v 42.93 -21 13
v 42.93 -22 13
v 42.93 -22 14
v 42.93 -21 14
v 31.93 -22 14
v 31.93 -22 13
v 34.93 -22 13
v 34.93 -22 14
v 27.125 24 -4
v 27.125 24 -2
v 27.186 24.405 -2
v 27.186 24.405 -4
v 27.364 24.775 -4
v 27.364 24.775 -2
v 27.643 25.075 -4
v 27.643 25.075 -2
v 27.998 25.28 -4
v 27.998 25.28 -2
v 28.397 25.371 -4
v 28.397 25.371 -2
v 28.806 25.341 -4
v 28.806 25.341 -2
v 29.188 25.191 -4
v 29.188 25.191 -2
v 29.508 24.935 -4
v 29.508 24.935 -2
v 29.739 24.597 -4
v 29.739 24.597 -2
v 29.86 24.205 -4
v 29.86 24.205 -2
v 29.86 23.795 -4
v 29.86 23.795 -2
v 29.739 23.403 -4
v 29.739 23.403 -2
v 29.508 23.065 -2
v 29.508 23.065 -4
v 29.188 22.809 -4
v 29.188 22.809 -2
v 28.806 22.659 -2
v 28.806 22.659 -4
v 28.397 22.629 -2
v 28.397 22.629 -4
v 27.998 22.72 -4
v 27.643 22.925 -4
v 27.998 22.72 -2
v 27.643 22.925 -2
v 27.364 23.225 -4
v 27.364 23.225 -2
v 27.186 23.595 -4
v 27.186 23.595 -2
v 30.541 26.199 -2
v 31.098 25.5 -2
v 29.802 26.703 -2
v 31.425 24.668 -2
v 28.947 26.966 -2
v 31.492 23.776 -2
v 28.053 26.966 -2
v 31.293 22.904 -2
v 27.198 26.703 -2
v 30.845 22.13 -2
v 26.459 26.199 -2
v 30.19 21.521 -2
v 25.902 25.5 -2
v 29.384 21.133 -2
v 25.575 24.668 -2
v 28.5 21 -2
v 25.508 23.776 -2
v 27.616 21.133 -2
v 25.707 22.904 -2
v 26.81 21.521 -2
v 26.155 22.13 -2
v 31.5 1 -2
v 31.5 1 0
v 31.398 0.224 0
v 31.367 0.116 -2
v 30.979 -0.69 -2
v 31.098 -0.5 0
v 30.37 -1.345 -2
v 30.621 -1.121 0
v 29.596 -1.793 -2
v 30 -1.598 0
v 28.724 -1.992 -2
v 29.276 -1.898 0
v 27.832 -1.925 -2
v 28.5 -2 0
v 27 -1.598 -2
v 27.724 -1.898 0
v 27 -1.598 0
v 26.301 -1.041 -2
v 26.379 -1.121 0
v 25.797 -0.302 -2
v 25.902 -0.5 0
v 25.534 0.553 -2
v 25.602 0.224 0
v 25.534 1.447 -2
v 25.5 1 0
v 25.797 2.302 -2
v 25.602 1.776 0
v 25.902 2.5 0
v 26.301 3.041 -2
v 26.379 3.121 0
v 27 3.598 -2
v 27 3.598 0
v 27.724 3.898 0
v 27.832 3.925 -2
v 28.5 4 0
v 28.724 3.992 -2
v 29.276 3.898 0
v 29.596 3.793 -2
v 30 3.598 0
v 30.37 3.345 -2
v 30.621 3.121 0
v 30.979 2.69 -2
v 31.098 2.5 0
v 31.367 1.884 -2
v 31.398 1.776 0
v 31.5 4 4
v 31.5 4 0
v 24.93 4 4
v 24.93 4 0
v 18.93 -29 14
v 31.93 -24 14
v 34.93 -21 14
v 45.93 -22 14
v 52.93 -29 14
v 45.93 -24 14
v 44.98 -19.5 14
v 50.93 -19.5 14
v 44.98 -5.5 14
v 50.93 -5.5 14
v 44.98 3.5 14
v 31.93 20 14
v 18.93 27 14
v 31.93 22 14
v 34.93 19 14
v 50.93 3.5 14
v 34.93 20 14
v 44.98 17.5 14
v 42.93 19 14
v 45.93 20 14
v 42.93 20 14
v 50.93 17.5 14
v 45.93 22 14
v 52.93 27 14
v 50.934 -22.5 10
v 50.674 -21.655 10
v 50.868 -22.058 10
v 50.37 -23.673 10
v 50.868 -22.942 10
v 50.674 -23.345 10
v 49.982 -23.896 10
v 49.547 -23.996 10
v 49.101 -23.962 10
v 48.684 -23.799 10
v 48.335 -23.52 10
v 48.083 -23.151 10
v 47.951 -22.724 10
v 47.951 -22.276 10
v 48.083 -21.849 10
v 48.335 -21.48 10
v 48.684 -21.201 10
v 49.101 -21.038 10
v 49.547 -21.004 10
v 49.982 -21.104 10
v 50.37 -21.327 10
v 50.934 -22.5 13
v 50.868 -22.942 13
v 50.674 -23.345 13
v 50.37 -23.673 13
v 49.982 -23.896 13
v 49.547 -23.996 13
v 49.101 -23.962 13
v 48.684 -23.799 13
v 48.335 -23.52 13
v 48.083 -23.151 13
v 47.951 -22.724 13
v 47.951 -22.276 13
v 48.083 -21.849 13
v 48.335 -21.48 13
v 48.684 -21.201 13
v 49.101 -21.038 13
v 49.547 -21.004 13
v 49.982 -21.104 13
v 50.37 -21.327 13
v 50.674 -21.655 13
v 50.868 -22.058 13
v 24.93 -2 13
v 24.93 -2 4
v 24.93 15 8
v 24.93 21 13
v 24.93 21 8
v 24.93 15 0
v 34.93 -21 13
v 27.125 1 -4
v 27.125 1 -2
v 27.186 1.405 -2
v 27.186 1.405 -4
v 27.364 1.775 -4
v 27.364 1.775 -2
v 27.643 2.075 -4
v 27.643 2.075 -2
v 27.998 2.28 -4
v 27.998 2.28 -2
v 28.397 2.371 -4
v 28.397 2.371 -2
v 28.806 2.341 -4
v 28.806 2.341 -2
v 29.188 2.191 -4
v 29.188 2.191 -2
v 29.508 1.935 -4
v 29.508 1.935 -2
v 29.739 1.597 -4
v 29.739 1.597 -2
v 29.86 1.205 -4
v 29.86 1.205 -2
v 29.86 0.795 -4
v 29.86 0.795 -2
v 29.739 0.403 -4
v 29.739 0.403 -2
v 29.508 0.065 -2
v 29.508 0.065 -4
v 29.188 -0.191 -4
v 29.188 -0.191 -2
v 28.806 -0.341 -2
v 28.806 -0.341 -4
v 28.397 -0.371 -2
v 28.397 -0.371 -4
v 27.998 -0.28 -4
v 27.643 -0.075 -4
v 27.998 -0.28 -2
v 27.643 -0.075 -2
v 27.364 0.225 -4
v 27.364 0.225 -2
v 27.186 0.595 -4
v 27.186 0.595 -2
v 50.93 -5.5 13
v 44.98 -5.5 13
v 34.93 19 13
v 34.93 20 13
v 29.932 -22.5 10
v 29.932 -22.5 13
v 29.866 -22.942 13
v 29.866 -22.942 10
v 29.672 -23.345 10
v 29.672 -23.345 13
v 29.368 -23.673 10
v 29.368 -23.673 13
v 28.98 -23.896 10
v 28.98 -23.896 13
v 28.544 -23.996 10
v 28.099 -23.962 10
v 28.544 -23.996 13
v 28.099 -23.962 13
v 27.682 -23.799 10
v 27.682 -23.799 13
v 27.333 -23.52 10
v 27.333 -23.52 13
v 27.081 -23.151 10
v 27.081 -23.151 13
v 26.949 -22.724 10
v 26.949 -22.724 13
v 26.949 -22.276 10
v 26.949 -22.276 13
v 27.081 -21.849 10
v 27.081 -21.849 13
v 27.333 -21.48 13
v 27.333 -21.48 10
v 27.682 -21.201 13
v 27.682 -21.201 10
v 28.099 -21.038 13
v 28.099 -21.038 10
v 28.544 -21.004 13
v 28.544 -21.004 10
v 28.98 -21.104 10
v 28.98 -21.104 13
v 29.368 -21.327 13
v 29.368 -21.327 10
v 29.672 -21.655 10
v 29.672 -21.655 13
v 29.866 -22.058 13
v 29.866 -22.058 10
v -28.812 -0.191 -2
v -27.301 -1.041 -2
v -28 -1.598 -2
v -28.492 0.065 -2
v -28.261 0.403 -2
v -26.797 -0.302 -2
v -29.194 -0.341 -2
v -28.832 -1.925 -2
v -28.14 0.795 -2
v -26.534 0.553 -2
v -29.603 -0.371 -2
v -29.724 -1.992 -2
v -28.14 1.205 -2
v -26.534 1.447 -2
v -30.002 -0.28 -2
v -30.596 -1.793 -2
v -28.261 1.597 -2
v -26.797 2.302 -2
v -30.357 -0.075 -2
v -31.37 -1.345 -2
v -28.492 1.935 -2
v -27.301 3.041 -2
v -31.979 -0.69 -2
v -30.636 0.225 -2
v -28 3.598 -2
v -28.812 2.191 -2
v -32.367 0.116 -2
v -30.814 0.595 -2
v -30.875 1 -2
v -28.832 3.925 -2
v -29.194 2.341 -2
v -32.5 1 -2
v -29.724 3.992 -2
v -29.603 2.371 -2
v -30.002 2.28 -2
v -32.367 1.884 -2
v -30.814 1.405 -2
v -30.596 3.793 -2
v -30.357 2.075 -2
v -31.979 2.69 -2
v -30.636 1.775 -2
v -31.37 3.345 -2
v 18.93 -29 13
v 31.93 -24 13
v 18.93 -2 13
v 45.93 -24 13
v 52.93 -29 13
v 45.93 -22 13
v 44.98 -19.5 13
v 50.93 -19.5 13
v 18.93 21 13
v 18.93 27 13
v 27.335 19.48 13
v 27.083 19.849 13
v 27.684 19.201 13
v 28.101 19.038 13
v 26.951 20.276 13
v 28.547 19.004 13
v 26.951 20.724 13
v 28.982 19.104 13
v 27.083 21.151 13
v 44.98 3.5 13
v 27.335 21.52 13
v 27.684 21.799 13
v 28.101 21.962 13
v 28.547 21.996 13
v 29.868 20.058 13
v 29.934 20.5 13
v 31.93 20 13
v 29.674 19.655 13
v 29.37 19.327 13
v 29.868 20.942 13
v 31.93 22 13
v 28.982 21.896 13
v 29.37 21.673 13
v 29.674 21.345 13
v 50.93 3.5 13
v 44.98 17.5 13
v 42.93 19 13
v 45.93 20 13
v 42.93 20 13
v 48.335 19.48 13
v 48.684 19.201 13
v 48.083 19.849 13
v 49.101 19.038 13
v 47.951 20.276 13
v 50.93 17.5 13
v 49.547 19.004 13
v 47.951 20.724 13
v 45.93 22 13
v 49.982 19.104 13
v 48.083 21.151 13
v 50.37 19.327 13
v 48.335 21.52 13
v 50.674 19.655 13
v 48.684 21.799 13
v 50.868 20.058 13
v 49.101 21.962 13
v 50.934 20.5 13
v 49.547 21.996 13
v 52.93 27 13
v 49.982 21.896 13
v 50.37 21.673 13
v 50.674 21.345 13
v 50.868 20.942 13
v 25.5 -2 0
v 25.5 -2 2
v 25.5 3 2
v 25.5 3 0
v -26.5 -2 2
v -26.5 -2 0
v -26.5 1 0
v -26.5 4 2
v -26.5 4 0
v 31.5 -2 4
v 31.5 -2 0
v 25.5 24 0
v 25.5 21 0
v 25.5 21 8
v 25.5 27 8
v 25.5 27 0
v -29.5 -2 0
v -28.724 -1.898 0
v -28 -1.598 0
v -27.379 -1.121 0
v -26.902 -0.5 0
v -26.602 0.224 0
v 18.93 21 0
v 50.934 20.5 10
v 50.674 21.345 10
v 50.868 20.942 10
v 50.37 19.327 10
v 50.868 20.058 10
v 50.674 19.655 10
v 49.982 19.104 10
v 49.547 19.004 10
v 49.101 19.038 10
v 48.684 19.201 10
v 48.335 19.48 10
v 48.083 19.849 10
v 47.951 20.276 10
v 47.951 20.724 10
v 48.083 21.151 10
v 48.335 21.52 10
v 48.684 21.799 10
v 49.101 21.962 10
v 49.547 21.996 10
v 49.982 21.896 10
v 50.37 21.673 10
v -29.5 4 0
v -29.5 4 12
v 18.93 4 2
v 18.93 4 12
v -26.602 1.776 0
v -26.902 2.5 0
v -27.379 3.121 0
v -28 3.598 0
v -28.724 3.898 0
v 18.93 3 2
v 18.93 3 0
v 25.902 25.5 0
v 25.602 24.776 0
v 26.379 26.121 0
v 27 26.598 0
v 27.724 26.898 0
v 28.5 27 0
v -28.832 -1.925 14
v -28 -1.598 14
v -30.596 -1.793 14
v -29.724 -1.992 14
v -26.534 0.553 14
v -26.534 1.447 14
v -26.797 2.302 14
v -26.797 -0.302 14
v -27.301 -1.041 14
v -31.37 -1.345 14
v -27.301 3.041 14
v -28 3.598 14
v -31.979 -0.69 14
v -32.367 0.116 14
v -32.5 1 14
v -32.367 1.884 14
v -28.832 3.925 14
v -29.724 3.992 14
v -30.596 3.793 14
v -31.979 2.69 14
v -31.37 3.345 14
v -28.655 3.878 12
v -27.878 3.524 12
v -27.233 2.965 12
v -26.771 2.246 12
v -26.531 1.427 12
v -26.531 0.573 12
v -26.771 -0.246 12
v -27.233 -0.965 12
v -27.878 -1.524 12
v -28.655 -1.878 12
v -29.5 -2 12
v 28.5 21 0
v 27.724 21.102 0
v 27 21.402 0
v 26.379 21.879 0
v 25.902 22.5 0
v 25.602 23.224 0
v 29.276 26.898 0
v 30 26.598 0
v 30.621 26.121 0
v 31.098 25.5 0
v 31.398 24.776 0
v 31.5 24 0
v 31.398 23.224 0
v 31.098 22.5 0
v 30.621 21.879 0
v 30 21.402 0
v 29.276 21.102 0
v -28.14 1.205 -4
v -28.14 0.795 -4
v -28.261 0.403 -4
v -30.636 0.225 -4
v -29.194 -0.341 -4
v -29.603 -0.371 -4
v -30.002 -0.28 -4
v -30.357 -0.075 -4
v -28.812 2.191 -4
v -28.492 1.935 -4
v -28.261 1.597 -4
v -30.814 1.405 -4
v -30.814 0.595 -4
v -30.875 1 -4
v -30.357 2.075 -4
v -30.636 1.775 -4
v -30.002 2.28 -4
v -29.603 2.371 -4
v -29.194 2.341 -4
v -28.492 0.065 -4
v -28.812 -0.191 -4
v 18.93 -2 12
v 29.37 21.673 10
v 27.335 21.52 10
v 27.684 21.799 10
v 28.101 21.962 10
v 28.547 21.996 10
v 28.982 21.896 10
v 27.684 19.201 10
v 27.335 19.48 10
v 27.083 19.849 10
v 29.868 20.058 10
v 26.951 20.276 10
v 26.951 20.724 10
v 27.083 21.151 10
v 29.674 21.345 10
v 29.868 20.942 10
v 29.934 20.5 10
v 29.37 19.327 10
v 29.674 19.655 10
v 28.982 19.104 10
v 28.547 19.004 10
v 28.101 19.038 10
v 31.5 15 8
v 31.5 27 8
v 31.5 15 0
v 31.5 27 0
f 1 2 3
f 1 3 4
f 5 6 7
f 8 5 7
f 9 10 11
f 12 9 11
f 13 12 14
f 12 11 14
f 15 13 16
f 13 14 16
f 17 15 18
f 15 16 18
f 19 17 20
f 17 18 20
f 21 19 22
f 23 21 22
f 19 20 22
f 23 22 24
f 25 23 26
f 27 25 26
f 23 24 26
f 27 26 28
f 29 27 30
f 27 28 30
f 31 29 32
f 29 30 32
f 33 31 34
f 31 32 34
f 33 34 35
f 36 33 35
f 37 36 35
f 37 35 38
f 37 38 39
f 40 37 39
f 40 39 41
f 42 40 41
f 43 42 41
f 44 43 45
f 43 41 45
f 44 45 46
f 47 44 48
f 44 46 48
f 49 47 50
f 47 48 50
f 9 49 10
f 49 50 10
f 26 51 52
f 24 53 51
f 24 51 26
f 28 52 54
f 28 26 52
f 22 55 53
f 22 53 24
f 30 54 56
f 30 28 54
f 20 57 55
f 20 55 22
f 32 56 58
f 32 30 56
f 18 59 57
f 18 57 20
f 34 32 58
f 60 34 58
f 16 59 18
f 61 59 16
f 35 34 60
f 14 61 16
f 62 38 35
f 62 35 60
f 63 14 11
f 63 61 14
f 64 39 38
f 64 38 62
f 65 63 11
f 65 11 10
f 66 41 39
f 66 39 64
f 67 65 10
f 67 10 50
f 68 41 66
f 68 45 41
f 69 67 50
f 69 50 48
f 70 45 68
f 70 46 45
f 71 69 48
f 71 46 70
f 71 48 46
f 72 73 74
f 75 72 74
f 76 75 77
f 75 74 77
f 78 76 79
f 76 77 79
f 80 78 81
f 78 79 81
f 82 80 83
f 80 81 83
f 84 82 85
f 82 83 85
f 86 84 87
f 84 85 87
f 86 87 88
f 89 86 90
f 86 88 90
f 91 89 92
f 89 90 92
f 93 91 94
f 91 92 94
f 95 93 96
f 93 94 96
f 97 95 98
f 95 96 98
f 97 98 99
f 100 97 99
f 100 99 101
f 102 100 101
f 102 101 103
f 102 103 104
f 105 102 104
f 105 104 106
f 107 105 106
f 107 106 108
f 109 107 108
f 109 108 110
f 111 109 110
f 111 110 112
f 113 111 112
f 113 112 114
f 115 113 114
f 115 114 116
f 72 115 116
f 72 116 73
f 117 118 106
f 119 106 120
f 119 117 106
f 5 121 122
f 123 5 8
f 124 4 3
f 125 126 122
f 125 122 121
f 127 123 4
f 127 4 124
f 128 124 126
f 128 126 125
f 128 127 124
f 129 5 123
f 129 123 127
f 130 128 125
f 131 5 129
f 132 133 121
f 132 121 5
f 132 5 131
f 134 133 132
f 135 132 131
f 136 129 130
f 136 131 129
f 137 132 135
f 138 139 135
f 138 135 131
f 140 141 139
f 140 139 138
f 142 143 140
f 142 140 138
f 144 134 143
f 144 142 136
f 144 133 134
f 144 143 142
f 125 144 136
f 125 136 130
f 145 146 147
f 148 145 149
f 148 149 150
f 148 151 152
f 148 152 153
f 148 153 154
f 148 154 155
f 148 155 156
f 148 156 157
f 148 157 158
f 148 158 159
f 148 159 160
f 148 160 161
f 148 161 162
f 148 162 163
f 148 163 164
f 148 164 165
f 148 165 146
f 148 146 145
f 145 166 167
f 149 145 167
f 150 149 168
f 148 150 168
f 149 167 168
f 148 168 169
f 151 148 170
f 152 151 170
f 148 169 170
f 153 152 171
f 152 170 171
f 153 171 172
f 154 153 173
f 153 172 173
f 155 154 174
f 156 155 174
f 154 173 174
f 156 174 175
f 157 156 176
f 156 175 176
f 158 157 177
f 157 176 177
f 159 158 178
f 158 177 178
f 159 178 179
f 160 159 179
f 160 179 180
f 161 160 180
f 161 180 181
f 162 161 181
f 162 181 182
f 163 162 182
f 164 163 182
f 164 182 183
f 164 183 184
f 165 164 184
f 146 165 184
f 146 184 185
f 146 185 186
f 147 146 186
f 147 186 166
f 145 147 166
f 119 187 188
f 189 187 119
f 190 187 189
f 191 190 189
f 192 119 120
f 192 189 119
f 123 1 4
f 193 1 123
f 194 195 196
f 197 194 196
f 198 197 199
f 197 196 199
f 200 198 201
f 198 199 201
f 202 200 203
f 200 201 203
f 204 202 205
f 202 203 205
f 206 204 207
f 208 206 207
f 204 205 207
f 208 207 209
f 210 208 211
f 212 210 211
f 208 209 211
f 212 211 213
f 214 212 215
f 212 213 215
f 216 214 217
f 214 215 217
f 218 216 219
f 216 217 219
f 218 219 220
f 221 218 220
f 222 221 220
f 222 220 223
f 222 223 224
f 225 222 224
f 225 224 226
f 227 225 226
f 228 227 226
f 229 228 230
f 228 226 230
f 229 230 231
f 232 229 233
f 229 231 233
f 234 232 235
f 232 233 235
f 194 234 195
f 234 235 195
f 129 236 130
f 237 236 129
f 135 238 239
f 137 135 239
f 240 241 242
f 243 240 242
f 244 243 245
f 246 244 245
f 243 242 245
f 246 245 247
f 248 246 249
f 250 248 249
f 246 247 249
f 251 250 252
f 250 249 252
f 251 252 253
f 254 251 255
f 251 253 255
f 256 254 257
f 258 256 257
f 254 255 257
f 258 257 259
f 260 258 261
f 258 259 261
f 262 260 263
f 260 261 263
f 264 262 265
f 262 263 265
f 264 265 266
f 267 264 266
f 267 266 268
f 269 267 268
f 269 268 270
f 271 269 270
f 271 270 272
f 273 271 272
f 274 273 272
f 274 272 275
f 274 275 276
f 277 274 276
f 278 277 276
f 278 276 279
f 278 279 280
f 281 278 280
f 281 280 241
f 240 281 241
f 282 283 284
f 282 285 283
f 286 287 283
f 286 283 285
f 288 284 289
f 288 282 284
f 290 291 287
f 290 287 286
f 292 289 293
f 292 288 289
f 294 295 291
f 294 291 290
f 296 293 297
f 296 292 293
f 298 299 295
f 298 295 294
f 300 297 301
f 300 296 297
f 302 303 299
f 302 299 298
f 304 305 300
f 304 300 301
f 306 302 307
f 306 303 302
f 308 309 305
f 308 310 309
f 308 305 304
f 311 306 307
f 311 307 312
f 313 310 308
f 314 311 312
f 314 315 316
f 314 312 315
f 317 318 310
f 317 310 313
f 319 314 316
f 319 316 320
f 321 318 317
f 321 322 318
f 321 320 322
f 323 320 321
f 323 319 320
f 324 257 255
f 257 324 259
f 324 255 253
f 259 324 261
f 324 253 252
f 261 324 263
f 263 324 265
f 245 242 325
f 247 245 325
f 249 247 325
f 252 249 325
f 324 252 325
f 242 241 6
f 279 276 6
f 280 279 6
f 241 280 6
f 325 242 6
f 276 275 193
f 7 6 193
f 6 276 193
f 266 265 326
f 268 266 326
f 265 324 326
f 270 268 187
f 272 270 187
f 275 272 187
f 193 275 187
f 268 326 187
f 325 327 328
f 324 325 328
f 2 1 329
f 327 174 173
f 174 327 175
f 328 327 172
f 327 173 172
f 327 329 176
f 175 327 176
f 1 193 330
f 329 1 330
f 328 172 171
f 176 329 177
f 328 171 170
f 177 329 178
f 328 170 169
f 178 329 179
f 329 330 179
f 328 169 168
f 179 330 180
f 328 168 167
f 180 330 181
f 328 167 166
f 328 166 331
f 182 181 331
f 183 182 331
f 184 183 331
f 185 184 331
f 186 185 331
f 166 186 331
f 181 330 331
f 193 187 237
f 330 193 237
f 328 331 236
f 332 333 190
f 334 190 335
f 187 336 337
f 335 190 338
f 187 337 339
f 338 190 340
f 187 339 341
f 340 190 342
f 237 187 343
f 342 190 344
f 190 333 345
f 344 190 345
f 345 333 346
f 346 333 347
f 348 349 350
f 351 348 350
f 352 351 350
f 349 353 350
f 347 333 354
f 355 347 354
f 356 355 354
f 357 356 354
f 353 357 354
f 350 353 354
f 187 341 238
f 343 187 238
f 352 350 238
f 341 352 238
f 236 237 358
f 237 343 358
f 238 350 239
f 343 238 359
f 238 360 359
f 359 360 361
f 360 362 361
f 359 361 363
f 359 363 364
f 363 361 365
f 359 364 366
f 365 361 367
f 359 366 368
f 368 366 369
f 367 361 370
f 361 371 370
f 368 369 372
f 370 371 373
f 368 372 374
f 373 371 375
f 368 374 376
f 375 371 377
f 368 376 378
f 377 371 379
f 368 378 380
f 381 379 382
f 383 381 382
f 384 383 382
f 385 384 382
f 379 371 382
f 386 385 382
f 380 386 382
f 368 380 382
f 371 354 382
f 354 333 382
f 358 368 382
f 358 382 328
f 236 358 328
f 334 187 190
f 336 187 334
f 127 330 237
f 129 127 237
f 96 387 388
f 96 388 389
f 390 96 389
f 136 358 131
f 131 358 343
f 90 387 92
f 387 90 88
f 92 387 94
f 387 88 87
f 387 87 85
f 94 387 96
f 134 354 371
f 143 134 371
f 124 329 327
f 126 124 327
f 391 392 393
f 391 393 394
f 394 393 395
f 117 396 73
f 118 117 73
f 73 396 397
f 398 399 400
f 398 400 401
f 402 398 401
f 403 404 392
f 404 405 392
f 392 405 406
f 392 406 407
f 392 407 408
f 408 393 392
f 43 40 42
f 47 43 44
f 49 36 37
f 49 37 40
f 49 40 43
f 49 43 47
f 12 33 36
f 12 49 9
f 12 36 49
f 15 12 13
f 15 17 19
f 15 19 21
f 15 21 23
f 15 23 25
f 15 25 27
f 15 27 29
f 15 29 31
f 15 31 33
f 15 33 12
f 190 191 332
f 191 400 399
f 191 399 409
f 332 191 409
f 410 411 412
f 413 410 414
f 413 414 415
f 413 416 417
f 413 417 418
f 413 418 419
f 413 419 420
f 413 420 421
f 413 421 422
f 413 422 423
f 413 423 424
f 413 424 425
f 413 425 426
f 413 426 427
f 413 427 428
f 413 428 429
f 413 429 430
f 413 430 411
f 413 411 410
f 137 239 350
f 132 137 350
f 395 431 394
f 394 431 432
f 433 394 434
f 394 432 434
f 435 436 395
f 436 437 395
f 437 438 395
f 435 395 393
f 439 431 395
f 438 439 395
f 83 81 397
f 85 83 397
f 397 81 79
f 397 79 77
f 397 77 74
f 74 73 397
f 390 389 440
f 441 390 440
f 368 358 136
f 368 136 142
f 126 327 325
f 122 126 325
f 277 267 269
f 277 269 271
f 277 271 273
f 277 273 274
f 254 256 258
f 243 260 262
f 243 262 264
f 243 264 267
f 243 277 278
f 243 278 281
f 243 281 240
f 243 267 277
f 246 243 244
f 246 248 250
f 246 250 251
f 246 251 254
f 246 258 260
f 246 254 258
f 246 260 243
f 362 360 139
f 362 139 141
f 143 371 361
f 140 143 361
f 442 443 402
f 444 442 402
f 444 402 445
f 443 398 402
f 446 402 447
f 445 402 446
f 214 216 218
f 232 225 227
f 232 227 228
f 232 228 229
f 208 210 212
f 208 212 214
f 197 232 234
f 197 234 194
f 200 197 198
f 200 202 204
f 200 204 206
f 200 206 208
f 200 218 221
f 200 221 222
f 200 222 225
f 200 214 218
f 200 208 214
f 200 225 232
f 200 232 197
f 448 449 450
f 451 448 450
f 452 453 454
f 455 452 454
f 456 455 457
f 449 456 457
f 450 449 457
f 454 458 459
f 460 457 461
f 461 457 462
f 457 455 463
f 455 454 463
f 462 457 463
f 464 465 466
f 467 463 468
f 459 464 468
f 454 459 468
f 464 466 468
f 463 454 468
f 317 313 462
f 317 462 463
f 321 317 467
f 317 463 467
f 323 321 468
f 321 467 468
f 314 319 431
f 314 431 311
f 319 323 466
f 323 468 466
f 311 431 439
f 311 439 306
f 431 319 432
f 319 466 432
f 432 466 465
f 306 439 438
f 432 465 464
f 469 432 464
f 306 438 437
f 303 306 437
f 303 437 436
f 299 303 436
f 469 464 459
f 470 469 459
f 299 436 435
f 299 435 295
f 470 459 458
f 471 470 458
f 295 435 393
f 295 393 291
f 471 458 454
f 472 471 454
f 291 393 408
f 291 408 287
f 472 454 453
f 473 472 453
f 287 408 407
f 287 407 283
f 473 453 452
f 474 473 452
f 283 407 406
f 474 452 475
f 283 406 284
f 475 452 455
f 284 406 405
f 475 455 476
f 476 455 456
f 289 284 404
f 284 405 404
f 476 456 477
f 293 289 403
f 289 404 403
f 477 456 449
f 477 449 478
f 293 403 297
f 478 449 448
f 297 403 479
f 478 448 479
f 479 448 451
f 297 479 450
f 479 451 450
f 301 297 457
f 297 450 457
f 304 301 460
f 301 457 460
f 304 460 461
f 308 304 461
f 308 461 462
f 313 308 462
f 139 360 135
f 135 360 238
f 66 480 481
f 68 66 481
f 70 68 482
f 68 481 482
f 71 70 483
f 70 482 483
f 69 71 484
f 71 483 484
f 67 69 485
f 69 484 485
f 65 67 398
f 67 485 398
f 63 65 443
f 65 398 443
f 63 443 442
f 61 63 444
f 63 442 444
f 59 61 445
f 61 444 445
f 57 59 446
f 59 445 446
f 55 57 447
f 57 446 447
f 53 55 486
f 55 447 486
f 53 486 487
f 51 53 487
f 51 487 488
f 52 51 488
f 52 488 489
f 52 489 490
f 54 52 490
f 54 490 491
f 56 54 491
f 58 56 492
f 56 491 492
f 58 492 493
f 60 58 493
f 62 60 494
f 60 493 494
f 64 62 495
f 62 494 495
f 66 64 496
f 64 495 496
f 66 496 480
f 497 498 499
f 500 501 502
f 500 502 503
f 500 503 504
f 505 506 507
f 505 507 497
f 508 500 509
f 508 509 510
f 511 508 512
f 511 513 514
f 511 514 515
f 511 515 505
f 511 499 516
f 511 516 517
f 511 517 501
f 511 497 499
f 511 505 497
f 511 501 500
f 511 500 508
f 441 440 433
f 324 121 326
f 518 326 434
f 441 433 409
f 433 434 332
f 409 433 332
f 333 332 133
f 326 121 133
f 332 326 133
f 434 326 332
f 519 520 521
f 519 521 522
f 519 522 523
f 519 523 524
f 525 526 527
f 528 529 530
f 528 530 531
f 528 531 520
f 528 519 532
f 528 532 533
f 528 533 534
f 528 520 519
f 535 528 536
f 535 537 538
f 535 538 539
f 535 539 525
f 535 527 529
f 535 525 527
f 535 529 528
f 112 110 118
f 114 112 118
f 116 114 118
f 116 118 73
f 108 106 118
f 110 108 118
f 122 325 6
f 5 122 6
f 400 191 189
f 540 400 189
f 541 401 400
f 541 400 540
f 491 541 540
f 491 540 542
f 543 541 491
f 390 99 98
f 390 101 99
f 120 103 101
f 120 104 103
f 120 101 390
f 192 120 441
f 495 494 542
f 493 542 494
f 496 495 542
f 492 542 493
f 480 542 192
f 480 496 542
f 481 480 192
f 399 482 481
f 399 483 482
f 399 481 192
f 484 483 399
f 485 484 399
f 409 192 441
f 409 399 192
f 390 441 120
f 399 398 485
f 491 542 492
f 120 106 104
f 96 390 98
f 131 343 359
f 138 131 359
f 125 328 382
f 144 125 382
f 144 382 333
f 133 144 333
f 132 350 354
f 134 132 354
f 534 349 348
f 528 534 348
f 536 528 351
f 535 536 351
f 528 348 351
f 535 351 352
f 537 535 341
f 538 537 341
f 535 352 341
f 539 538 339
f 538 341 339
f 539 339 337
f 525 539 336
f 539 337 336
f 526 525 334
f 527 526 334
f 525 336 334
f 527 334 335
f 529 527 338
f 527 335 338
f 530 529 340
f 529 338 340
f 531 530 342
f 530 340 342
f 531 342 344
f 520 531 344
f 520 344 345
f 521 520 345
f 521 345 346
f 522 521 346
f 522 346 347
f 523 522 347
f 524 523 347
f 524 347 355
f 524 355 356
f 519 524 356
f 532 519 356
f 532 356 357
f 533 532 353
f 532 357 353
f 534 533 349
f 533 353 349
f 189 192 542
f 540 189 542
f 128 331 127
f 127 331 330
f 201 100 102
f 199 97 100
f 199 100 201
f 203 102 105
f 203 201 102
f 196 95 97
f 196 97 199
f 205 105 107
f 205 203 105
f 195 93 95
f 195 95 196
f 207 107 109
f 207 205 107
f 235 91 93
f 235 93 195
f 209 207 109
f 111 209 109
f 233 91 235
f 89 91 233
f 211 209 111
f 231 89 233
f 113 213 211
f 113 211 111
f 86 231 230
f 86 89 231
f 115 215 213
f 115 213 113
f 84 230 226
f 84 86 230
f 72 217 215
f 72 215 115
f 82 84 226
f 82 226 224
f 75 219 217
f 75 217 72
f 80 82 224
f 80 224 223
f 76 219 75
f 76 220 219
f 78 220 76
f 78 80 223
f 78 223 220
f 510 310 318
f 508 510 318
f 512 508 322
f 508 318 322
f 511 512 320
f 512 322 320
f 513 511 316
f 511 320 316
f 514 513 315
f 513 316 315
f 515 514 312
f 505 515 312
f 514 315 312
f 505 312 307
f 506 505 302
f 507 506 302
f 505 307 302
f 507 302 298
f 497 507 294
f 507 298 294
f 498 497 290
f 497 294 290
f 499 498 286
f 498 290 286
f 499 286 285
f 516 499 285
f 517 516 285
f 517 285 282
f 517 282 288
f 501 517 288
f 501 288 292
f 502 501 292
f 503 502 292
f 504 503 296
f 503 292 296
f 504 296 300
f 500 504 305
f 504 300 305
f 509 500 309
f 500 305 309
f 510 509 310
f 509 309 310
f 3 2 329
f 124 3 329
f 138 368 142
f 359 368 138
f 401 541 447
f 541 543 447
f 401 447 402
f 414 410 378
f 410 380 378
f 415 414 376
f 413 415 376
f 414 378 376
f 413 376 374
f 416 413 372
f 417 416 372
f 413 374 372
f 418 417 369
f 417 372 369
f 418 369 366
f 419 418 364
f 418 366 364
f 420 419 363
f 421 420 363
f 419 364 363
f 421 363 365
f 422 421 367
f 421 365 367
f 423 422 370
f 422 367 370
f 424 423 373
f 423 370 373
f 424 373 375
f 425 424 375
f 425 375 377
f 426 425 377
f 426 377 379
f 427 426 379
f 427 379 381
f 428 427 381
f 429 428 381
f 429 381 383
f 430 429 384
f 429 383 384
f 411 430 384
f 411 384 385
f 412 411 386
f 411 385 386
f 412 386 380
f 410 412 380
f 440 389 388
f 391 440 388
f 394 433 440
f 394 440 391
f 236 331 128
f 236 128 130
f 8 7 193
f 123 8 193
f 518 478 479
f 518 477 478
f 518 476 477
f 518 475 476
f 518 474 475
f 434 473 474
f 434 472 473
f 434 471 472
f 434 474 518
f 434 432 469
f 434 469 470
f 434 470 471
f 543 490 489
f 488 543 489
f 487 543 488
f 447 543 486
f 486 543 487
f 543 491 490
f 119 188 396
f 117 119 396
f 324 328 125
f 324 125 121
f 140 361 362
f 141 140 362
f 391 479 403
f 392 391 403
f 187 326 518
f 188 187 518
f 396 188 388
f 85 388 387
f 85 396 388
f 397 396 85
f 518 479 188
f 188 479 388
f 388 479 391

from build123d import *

# Parameters (mm, degrees)
SKETCH_1_W            = 65
SKETCH_1_H            = 6
EXTRUDE_1_DEPTH       = 12
FILLET_4_R            = 3
FILLET_5_R            = 3
SKETCH_7_R            = 1.375
EXTRUDE_2_DEPTH       = 4
SKETCH_8_R            = 3
EXTRUDE_3_DEPTH       = 2
EXTRUDE_START         = 4
SKETCH_9_R            = 3
EXTRUDE_4_DEPTH       = 4
SKETCH_10_R           = 3
EXTRUDE_5_DEPTH       = 2
SKETCH_11_R           = 1.375
EXTRUDE_6_DEPTH       = 2
SKETCH_12_W           = 6
SKETCH_12_H           = 6
EXTRUDE_7_DEPTH       = 2
SKETCH_13_W           = 6
SKETCH_13_H           = 30
EXTRUDE_8_DEPTH       = 2
SKETCH_14_R           = 3
EXTRUDE_9_DEPTH       = 2
SKETCH_15_R           = 1.375
EXTRUDE_10_DEPTH      = 4
SKETCH_18_W           = 6
SKETCH_18_H           = 30
EXTRUDE_11_DEPTH      = 4
SKETCH_19_W           = 6
SKETCH_19_H           = 30
EXTRUDE_12_DEPTH      = 10
SKETCH_29_W           = 68.740273107
SKETCH_29_H           = 36.698484322
CUT_EXTRUDE_3_DEPTH   = 2
SKETCH_30_W           = 7.57
SKETCH_30_H           = 6
CUT_EXTRUDE_4_DEPTH   = 12
SKETCH_31_W           = 7.57
SKETCH_31_H           = 24
EXTRUDE_18_DEPTH      = 2
SKETCH_32_W           = 6
SKETCH_32_H           = 18
CUT_EXTRUDE_6_DEPTH   = 2
SKETCH_33_W           = 1.57
SKETCH_33_H           = 18
CUT_EXTRUDE_7_DEPTH   = 2
SKETCH_34_W           = 34
SKETCH_34_H           = 50
EXTRUDE_19_DEPTH      = 1
SKETCH_35_R           = 1.5
EXTRUDE_20_DEPTH      = 2
SKETCH_36_W           = 18
SKETCH_36_H           = 4
CUT_EXTRUDE_8_DEPTH   = 3
SKETCH_37_W           = 18
SKETCH_37_H           = 4
CUT_EXTRUDE_9_DEPTH   = 3
SKETCH_38_W           = 7.949608938
SKETCH_38_H           = 37
CUT_EXTRUDE_10_DEPTH  = 3
SKETCH_39_W           = 2
SKETCH_39_H           = 38.777384981
EXTRUDE_21_DEPTH      = 1
SKETCH_40_W           = 19.891420203
SKETCH_40_H           = 2
EXTRUDE_22_DEPTH      = 1
SKETCH_41_W           = 18
SKETCH_41_H           = 2
EXTRUDE_23_DEPTH      = 1
SKETCH_42_W           = 5.949608938
SKETCH_42_H           = 7.78599904
EXTRUDE_24_DEPTH      = 1
SKETCH_43_W           = 2
SKETCH_43_H           = 2
EXTRUDE_25_DEPTH      = 1
SKETCH_44_W           = 34
SKETCH_44_H           = 6
EXTRUDE_26_DEPTH      = 1
SKETCH_45_W           = 5.949608938
SKETCH_45_H           = 1.150209715
SKETCH_45_H_2         = 0.063791245
EXTRUDE_27_DEPTH      = 1
SKETCH_46_W           = 7
SKETCH_46_H           = 1
CUT_EXTRUDE_11_DEPTH  = 11
SKETCH_47_W           = 5
SKETCH_47_H           = 6
EXTRUDE_28_DEPTH      = 7
SKETCH_48_W           = 7.57
SKETCH_48_H           = 6
EXTRUDE_29_DEPTH      = 2
SKETCH_50_W           = 26.677609113
SKETCH_50_H           = 51.423807613
EXTRUDE_35_DEPTH      = 1
SKETCH_53_W           = 28.548663147
SKETCH_53_H           = 51.906660266
CUT_EXTRUDE_21_DEPTH  = 2
SKETCH_52_R           = 1.5
EXTRUDE_37_DEPTH      = 2
SKETCH_49_W           = 5.949608938
SKETCH_49_H           = 14
CUT_EXTRUDE_22_DEPTH  = 4
SKETCH_55_W           = 2
SKETCH_55_H           = 29.414250284
EXTRUDE_40_DEPTH      = 4
SKETCH_58_W           = 25.591190643
SKETCH_58_H           = 50.94095496
CUT_EXTRUDE_23_DEPTH  = 4
SKETCH_57_R           = 1.5
EXTRUDE_41_DEPTH      = 2
SKETCH_60_W           = 26.134399878
SKETCH_60_H           = 52.268799757
EXTRUDE_43_DEPTH      = 1
SKETCH_59_W           = 5.949608938
SKETCH_59_H           = 14
CUT_EXTRUDE_24_DEPTH  = 1
SKETCH_64_W           = 54.796032673
SKETCH_64_H           = 10.19721688
CUT_EXTRUDE_25_DEPTH  = 43
SKETCH_62_R           = 3
EXTRUDE_44_DEPTH      = 2
SKETCH_63_R           = 3
EXTRUDE_45_DEPTH      = 2
SKETCH_65_R           = 1.375
EXTRUDE_46_DEPTH      = 2
SKETCH_66_W           = 1
SKETCH_66_H           = 30
CUT_EXTRUDE_26_DEPTH  = 5
SKETCH_68_W           = 6.57
SKETCH_68_H           = 9
EXTRUDE_47_DEPTH      = 12
SKETCH_67_W           = 6.57
SKETCH_67_H           = 6
CUT_EXTRUDE_29_DEPTH  = 13
SKETCH_70_W           = 48.43
SKETCH_70_H           = 12
EXTRUDE_48_DEPTH      = 7
SKETCH_71_W           = 6.57
SKETCH_71_H           = 4
EXTRUDE_49_DEPTH      = 1
SKETCH_74_R           = 3
CUT_EXTRUDE_30_DEPTH  = 32
SKETCH_75_W           = 3.133028802
SKETCH_75_H           = 7
EXTRUDE_51_DEPTH      = 12
SKETCH_76_W           = 8.590635634
SKETCH_76_H           = 9.113505167
CUT_EXTRUDE_31_DEPTH  = 12
SKETCH_77_W           = 13
SKETCH_77_H           = 1
CUT_EXTRUDE_32_DEPTH  = 124
SKETCH_72_R           = 3
EXTRUDE_52_DEPTH      = 2
EXTRUDE_53_DEPTH      = 2
EXTRUDE_53_DEPTH_BACK = 14
SKETCH_73_R           = 3
SKETCH_78_R           = 1.375
EXTRUDE_54_DEPTH      = 2
SKETCH_79_W           = 52
SKETCH_79_H           = 6
CUT_EXTRUDE_33_DEPTH  = 2
SKETCH_80_W           = 6.57
SKETCH_80_H           = 1
EXTRUDE_55_DEPTH      = 2
SKETCH_81_W           = 8
SKETCH_81_H           = 1
CUT_EXTRUDE_34_DEPTH  = 2
SKETCH_82_W           = 6.57
SKETCH_82_H           = 1
CUT_EXTRUDE_35_DEPTH  = 45
SKETCH_83_R           = 1.5
SKETCH_83_R_2         = 1.497866477
EXTRUDE_56_DEPTH      = 1
SKETCH_84_R           = 2.738772592
CUT_EXTRUDE_36_DEPTH  = 3
SKETCH_85_R           = 1.5
EXTRUDE_57_DEPTH      = 3


with BuildPart() as part:
    # 草图1 → 凸台-拉伸1 (new body)
    with BuildSketch(Plane.XY):
        Rectangle(SKETCH_1_W, SKETCH_1_H)
    extrude(amount=EXTRUDE_1_DEPTH)

    # 圆角4
    fillet_4_edges = [part.edges().sort_by_distance(p)[0] for p in [
        (-32.5, -3, 6),
    ]]
    fillet(fillet_4_edges, radius=FILLET_4_R)

    # 圆角5
    fillet_5_edges = [part.edges().sort_by_distance(p)[0] for p in [
        (-32.5, 3, 6),
    ]]
    fillet(fillet_5_edges, radius=FILLET_5_R - 0.0001)  # a hair under: the kernel refuses the full size

    # 草图7 → 凸台-拉伸2 (add)
    with BuildSketch(Plane(origin=(0, 0, 0), x_dir=(-1, 0, 0), z_dir=(0, 0, -1))):
        with Locations((29.5, 0)):
            Circle(SKETCH_7_R)
    extrude(amount=EXTRUDE_2_DEPTH)

    # 草图8 → 凸台-拉伸3 (add)
    with BuildSketch(Plane(origin=(0, 0, 0), x_dir=(-1, 0, 0), z_dir=(0, 0, -1))):
        with Locations((29.5, 0)):
            Circle(SKETCH_8_R)
    extrude(amount=EXTRUDE_3_DEPTH)

    # 草图9 → 凸台-拉伸4 (add)
    with BuildSketch(Plane.XY.offset(12).offset(EXTRUDE_START)):
        with Locations(Location((-29.5, 0, 0), (0, 0, 180))):
            Circle(SKETCH_9_R)
    extrude(amount=-EXTRUDE_4_DEPTH)

    # 草图10 → 凸台-拉伸5 (add)
    with BuildSketch(Plane(origin=(0, 0, 0), x_dir=(-1, 0, 0), z_dir=(0, 0, -1))):
        with Locations(Location((-29.5, 0, 0), (0, 0, 180))):
            Circle(SKETCH_10_R)
    extrude(amount=EXTRUDE_5_DEPTH)

    # 草图11 → 凸台-拉伸6 (add)
    with BuildSketch(Plane(origin=(0, 0, -2), x_dir=(-1, 0, 0), z_dir=(0, 0, -1))):
        with Locations((-29.5, 0)):
            Circle(SKETCH_11_R)
    extrude(amount=EXTRUDE_6_DEPTH)

    # 草图12 → 凸台-拉伸7 (add)
    with BuildSketch(Plane.XY.offset(12)):
        with Locations((29.5, 0)):
            Rectangle(SKETCH_12_W, SKETCH_12_H)
    extrude(amount=EXTRUDE_7_DEPTH)

    # 草图13 → 凸台-拉伸8 (add)
    with BuildSketch(Plane(origin=(0, 0, 0), x_dir=(-1, 0, 0), z_dir=(0, 0, -1))):
        with Locations((-29.5, 12)):
            Rectangle(SKETCH_13_W, SKETCH_13_H)
    extrude(amount=-EXTRUDE_8_DEPTH)

    # 草图14 → 凸台-拉伸9 (add)
    with BuildSketch(Plane(origin=(0, 0, 0), x_dir=(-1, 0, 0), z_dir=(0, 0, -1))):
        with Locations((-29.5, 24)):
            Circle(SKETCH_14_R)
    extrude(amount=EXTRUDE_9_DEPTH)

    # 草图15 → 凸台-拉伸10 (add)
    with BuildSketch(Plane(origin=(0, 0, 0), x_dir=(-1, 0, 0), z_dir=(0, 0, -1))):
        with Locations((-29.5, 24)):
            Circle(SKETCH_15_R)
    extrude(amount=EXTRUDE_10_DEPTH)

    # 草图18 → 凸台-拉伸11 (add)
    with BuildSketch(Plane.XY.offset(12)):
        with Locations((21.93, 12)):
            Rectangle(SKETCH_18_W, SKETCH_18_H)
    extrude(amount=EXTRUDE_11_DEPTH)

    # 草图19 → 凸台-拉伸12 (add)
    with BuildSketch(Plane(origin=(0, 0, 12), x_dir=(-1, 0, 0), z_dir=(0, 0, -1))):
        with Locations((-21.93, 12)):
            Rectangle(SKETCH_19_W, SKETCH_19_H)
    extrude(amount=EXTRUDE_12_DEPTH)

    # 草图29 → 切除-拉伸3 (cut)
    with BuildSketch(Plane.XY.offset(16)):
        with Locations((-9.440136553, 8.650757839)):
            Rectangle(SKETCH_29_W, SKETCH_29_H)
    extrude(amount=-CUT_EXTRUDE_3_DEPTH, mode=Mode.SUBTRACT)

    # 草图30 → 切除-拉伸4 (cut)
    with BuildSketch(Plane.XY.offset(14)):
        with Locations((28.715, 0)):
            Rectangle(SKETCH_30_W, SKETCH_30_H)
    extrude(amount=-CUT_EXTRUDE_4_DEPTH, mode=Mode.SUBTRACT)

    # 草图31 → 凸台-拉伸18 (add)
    with BuildSketch(Plane(origin=(0, 0, 2), x_dir=(-1, 0, 0), z_dir=(0, 0, -1))):
        with Locations((-22.715, 15)):
            Rectangle(SKETCH_31_W, SKETCH_31_H)
    extrude(amount=EXTRUDE_18_DEPTH)

    # 草图32 → 切除-拉伸6 (cut)
    with BuildSketch(Plane(origin=(0, 0, 0), x_dir=(-1, 0, 0), z_dir=(0, 0, -1))):
        with Locations((-29.5, 12)):
            Rectangle(SKETCH_32_W, SKETCH_32_H)
    extrude(amount=-CUT_EXTRUDE_6_DEPTH, mode=Mode.SUBTRACT)

    # 草图33 → 切除-拉伸7 (cut)
    with BuildSketch(Plane.XY.offset(2)):
        with Locations((25.715, 12)):
            Rectangle(SKETCH_33_W, SKETCH_33_H)
    extrude(amount=-CUT_EXTRUDE_7_DEPTH, mode=Mode.SUBTRACT)

    # 草图34 → 凸台-拉伸19 (add)
    with BuildSketch(Plane.XY.offset(14)):
        with Locations((35.93, 2)):
            Rectangle(SKETCH_34_W, SKETCH_34_H)
    extrude(amount=-EXTRUDE_19_DEPTH)

    # 草图35 → 凸台-拉伸20 (add)
    with BuildSketch(Plane(origin=(0, 0, 13), x_dir=(-1, 0, 0), z_dir=(0, 0, -1))):
        with Locations(Location((-49.43, 23.5, 0), (0, 0, 180))):
            Circle(SKETCH_35_R)
        with Locations(Location((-49.43, -19.5, 0), (0, 0, 180))):
            Circle(SKETCH_35_R)
        with Locations(Location((-28.43, -19.5, 0), (0, 0, 180))):
            Circle(SKETCH_35_R)
        with Locations(Location((-28.43, 23.5, 0), (0, 0, 180))):
            Circle(SKETCH_35_R)
    extrude(amount=EXTRUDE_20_DEPTH)

    # 草图36 → 切除-拉伸8 (cut)
    with BuildSketch(Plane(origin=(0, 0, 13), x_dir=(-1, 0, 0), z_dir=(0, 0, -1))):
        with Locations((-38.93, 25)):
            Rectangle(SKETCH_36_W, SKETCH_36_H)
    extrude(amount=-CUT_EXTRUDE_8_DEPTH, mode=Mode.SUBTRACT)

    # 草图37 → 切除-拉伸9 (cut)
    with BuildSketch(Plane(origin=(0, 0, 13), x_dir=(-1, 0, 0), z_dir=(0, 0, -1))):
        with Locations((-38.93, -21)):
            Rectangle(SKETCH_37_W, SKETCH_37_H)
    extrude(amount=-CUT_EXTRUDE_9_DEPTH, mode=Mode.SUBTRACT)

    # 草图38 → 切除-拉伸10 (cut)
    with BuildSketch(Plane(origin=(0, 0, 13), x_dir=(-1, 0, 0), z_dir=(0, 0, -1))):
        with Locations((-48.955195531, 2)):
            Rectangle(SKETCH_38_W, SKETCH_38_H)
    extrude(amount=-CUT_EXTRUDE_10_DEPTH, mode=Mode.SUBTRACT)

    # 草图39 → 凸台-拉伸21 (add)
    with BuildSketch(Plane(origin=(0, 0, 13), x_dir=(-1, 0, 0), z_dir=(0, 0, -1))):
        with Locations((-51.93, 1.111307509)):
            Rectangle(SKETCH_39_W, SKETCH_39_H)
    extrude(amount=-EXTRUDE_21_DEPTH)

    # 草图40 → 凸台-拉伸22 (add)
    with BuildSketch(Plane(origin=(0, 0, 13), x_dir=(-1, 0, 0), z_dir=(0, 0, -1))):
        with Locations((-37.984289899, 26)):
            Rectangle(SKETCH_40_W, SKETCH_40_H)
    extrude(amount=-EXTRUDE_22_DEPTH)

    # 草图41 → 凸台-拉伸23 (add)
    with BuildSketch(Plane(origin=(0, 0, 13), x_dir=(-1, 0, 0), z_dir=(0, 0, -1))):
        with Locations((-38.93, -22)):
            Rectangle(SKETCH_41_W, SKETCH_41_H)
    extrude(amount=-EXTRUDE_23_DEPTH)

    # 草图42 → 凸台-拉伸24 (add)
    with BuildSketch(Plane(origin=(0, 0, 13), x_dir=(-1, 0, 0), z_dir=(0, 0, -1))):
        with Locations((-47.955195531, 1.456790765)):
            Rectangle(SKETCH_42_W, SKETCH_42_H)
    extrude(amount=-EXTRUDE_24_DEPTH)

    # 草图43 → 凸台-拉伸25 (add)
    with BuildSketch(Plane(origin=(0, 0, 13), x_dir=(-1, 0, 0), z_dir=(0, 0, -1))):
        with Locations((-46.93, -20)):
            Rectangle(SKETCH_43_W, SKETCH_43_H)
        with Locations((-30.93, -20)):
            Rectangle(SKETCH_43_W, SKETCH_43_H)
        with Locations((-46.93, 24)):
            Rectangle(SKETCH_43_W, SKETCH_43_H)
        with Locations((-30.93, 24)):
            Rectangle(SKETCH_43_W, SKETCH_43_H)
    extrude(amount=-EXTRUDE_25_DEPTH)

    # 草图44 → 凸台-拉伸26 (add)
    with BuildSketch(Plane(origin=(0, 0, 13), x_dir=(-1, 0, 0), z_dir=(0, 0, -1))):
        with Locations((-35.93, -26)):
            Rectangle(SKETCH_44_W, SKETCH_44_H)
    extrude(amount=-EXTRUDE_26_DEPTH)

    # 草图45 → 凸台-拉伸27 (add)
    with BuildSketch(Plane.XY.offset(14)):
        with Locations((47.955195531, 5.924895143)):
            Rectangle(SKETCH_45_W, SKETCH_45_H)
        with Locations((47.955195531, -2.468104378)):
            Rectangle(SKETCH_45_W, SKETCH_45_H_2)
    extrude(amount=-EXTRUDE_27_DEPTH)

    # 草图46 → 切除-拉伸11 (cut)
    with BuildSketch(Plane.XY.offset(14)):
        with Locations((38.93, 22.5)):
            Rectangle(SKETCH_46_W, SKETCH_46_H)
        with Locations((38.93, -18.5)):
            Rectangle(SKETCH_46_W, SKETCH_46_H)
    extrude(amount=-CUT_EXTRUDE_11_DEPTH, mode=Mode.SUBTRACT)

    # 草图47 → 凸台-拉伸28 (add)
    with BuildSketch(Plane.XY.offset(2)):
        with Locations((27.43, 24)):
            Rectangle(SKETCH_47_W, SKETCH_47_H)
    extrude(amount=EXTRUDE_28_DEPTH)

    # 草图48 → 凸台-拉伸29 (add)
    with BuildSketch(Plane.XY.offset(2)):
        with Locations((28.715, 0)):
            Rectangle(SKETCH_48_W, SKETCH_48_H)
    extrude(amount=EXTRUDE_29_DEPTH)

    # 草图50 → 凸台-拉伸35 (add)
    with BuildSketch(Plane(origin=(0, 0, 13), x_dir=(-1, 0, 0), z_dir=(0, 0, -1))):
        with Locations((-38.341167074, 0.599449416)):
            Rectangle(SKETCH_50_W, SKETCH_50_H)
    extrude(amount=-EXTRUDE_35_DEPTH)

    # 草图53 → 切除-拉伸21 (cut)
    with BuildSketch(Plane(origin=(0, 0, 13), x_dir=(-1, 0, 0), z_dir=(0, 0, -1))):
        with Locations((-37.767779549, -0.124829565)):
            Rectangle(SKETCH_53_W, SKETCH_53_H)
    extrude(amount=CUT_EXTRUDE_21_DEPTH, mode=Mode.SUBTRACT)

    # 草图52 → 凸台-拉伸37 (add)
    with BuildSketch(Plane(origin=(0, 0, 13), x_dir=(-1, 0, 0), z_dir=(0, 0, -1))):
        with Locations(Location((-49.43, 19.5, 0), (0, 0, 180))):
            Circle(SKETCH_52_R)
        with Locations(Location((-28.43, 19.5, 0), (0, 0, 180))):
            Circle(SKETCH_52_R)
        with Locations(Location((-49.43, -23.5, 0), (0, 0, 180))):
            Circle(SKETCH_52_R)
        with Locations(Location((-28.43, -23.5, 0), (0, 0, 180))):
            Circle(SKETCH_52_R)
    extrude(amount=EXTRUDE_37_DEPTH)

    # 草图49 → 切除-拉伸22 (cut)
    with BuildSketch(Plane(origin=(0, 0, 13), x_dir=(-1, 0, 0), z_dir=(0, 0, -1))):
        Polygon((-45.93, -23), (-45.93, -25), (-31.93, -25), (-31.93, -23), (-35.43, -23), (-35.43, -22), (-42.43, -22), (-42.43, -23), align=None)
        Polygon((-45.93, 19), (-42.43, 19), (-42.43, 18), (-35.43, 18), (-35.43, 19), (-31.93, 19), (-31.93, 21), (-45.93, 21), align=None)
        with Locations((-47.955195531, -13.5)):
            Rectangle(SKETCH_49_W, SKETCH_49_H)
        with Locations((-47.955195531, 9.5)):
            Rectangle(SKETCH_49_W, SKETCH_49_H)
    extrude(amount=-CUT_EXTRUDE_22_DEPTH, mode=Mode.SUBTRACT)

    # 草图55 → 凸台-拉伸40 (add)
    with BuildSketch(Plane(origin=(24.93, 0, 0), x_dir=(0, 0, -1), z_dir=(1, 0, 0))):
        with Locations((-12, 11.707125142)):
            Rectangle(SKETCH_55_W, SKETCH_55_H)
    extrude(amount=-EXTRUDE_40_DEPTH)

    # 草图58 → 切除-拉伸23 (cut)
    with BuildSketch(Plane(origin=(0, 0, 13), x_dir=(-1, 0, 0), z_dir=(0, 0, -1))):
        with Locations((-38.582593401, -2.840875742)):
            Rectangle(SKETCH_58_W, SKETCH_58_H)
    extrude(amount=CUT_EXTRUDE_23_DEPTH, mode=Mode.SUBTRACT)

    # 草图57 → 凸台-拉伸41 (add)
    with BuildSketch(Plane(origin=(0, 0, 13), x_dir=(-1, 0, 0), z_dir=(0, 0, -1))):
        with Locations(Location((-49.434447137, 20.499990111, 0), (0, 0, 180))):
            Circle(SKETCH_57_R)
        with Locations(Location((-28.434447137, 20.499990111, 0), (0, 0, 180))):
            Circle(SKETCH_57_R)
        with Locations(Location((-28.432313614, -22.500002676, 0), (0, 0, 180))):
            Circle(SKETCH_57_R)
        with Locations(Location((-49.434447137, -22.500002676, 0), (0, 0, 180))):
            Circle(SKETCH_57_R)
    extrude(amount=EXTRUDE_41_DEPTH)

    # 草图60 → 凸台-拉伸43 (add)
    with BuildSketch(Plane(origin=(0, 0, 13), x_dir=(-1, 0, 0), z_dir=(0, 0, -1))):
        with Locations((-39.337050673, -0.849108546)):
            Rectangle(SKETCH_60_W, SKETCH_60_H)
    extrude(amount=-EXTRUDE_43_DEPTH)

    # 草图59 → 切除-拉伸24 (cut)
    with BuildSketch(Plane(origin=(0, 0, 13), x_dir=(-1, 0, 0), z_dir=(0, 0, -1))):
        with Locations((-47.955195531, -12.5)):
            Rectangle(SKETCH_59_W, SKETCH_59_H)
        with Locations((-47.955195531, 10.5)):
            Rectangle(SKETCH_59_W, SKETCH_59_H)
        Polygon((-45.93, 22), (-45.93, 20), (-42.43, 20), (-42.43, 19), (-35.43, 19), (-35.43, 20), (-31.93, 20), (-31.93, 22), align=None)
        Polygon((-45.93, -24), (-31.93, -24), (-31.93, -22), (-35.43, -22), (-35.43, -21), (-42.43, -21), (-42.43, -22), (-45.93, -22), align=None)
    extrude(amount=-CUT_EXTRUDE_24_DEPTH, mode=Mode.SUBTRACT)

    # 草图64 → 切除-拉伸25 (cut)
    with BuildSketch(Plane.XZ.offset(3)):
        with Locations((5.101983663, -5.09860844)):
            Rectangle(SKETCH_64_W, SKETCH_64_H)
    extrude(amount=-CUT_EXTRUDE_25_DEPTH, mode=Mode.SUBTRACT)

    # 草图62 → 凸台-拉伸44 (add)
    with BuildSketch(Plane(origin=(0, 0, 0), x_dir=(-1, 0, 0), z_dir=(0, 0, -1))):
        with Locations(Location((-28.5, 0, 0), (0, 0, 270))):
            Circle(SKETCH_62_R)
    extrude(amount=EXTRUDE_44_DEPTH)

    # 草图63 → 凸台-拉伸45 (add)
    with BuildSketch(Plane(origin=(0, 0, 0), x_dir=(-1, 0, 0), z_dir=(0, 0, -1))):
        with Locations(Location((-28.5, 24, 0), (0, 0, 270))):
            Circle(SKETCH_63_R)
    extrude(amount=EXTRUDE_45_DEPTH)

    # 草图65 → 凸台-拉伸46 (add)
    with BuildSketch(Plane(origin=(0, 0, -2), x_dir=(-1, 0, 0), z_dir=(0, 0, -1))):
        with Locations((-28.5, 24)):
            Circle(SKETCH_65_R)
        with Locations((-28.5, 0)):
            Circle(SKETCH_65_R)
    extrude(amount=EXTRUDE_46_DEPTH)

    # 草图66 → 切除-拉伸26 (cut)
    with BuildSketch(Plane(origin=(0, 0, 0), x_dir=(-1, 0, 0), z_dir=(0, 0, -1))):
        with Locations((-32, 12)):
            Rectangle(SKETCH_66_W, SKETCH_66_H)
    extrude(amount=-CUT_EXTRUDE_26_DEPTH, mode=Mode.SUBTRACT)

    # 草图68 → 凸台-拉伸47 (add)
    with BuildSketch(Plane(origin=(0, 27, 0), x_dir=(1, 0, 0), z_dir=(0, 1, 0))):
        with Locations((28.215, -4.5)):
            Rectangle(SKETCH_68_W, SKETCH_68_H)
    extrude(amount=-EXTRUDE_47_DEPTH)

    # 草图67 → 切除-拉伸29 (cut)
    with BuildSketch(Plane(origin=(0, 0, 0), x_dir=(-1, 0, 0), z_dir=(0, 0, -1))):
        with Locations((-22.215, 24)):
            Rectangle(SKETCH_67_W, SKETCH_67_H)
    extrude(amount=-CUT_EXTRUDE_29_DEPTH, mode=Mode.SUBTRACT)

    # 草图70 → 凸台-拉伸48 (add)
    with BuildSketch(Plane.XZ.offset(3)):
        Polygon((24.93, 4), (24.93, 13), (18.93, 13), (18.93, 12), (18.93, 0), (24.93, 0), align=None)
        with Locations((-5.285, 6)):
            Rectangle(SKETCH_70_W, SKETCH_70_H)
    extrude(amount=-EXTRUDE_48_DEPTH)

    # 草图71 → 凸台-拉伸49 (add)
    with BuildSketch(Plane(origin=(0, 3, 0), x_dir=(1, 0, 0), z_dir=(0, 1, 0))):
        with Locations((28.215, -2)):
            Rectangle(SKETCH_71_W, SKETCH_71_H)
    extrude(amount=EXTRUDE_49_DEPTH)

    # 草图74 → 切除-拉伸30 (cut)
    with BuildSketch(Plane.XY.offset(14)):
        with Locations((-29.5, 0)):
            Circle(SKETCH_74_R)
    extrude(amount=-CUT_EXTRUDE_30_DEPTH, mode=Mode.SUBTRACT)


with BuildPart() as cut_extrude_30_kept_piece:
    # of the separate pieces the step leaves, the one the design keeps (cut_extrude_30_pieces_kept)
    add(part.part.solids().sort_by_distance((28.5, -3, 0))[0])

    # 草图75 → 凸台-拉伸51 (add)
    with BuildSketch(Plane(origin=(0, 0, 0), x_dir=(-1, 0, 0), z_dir=(0, 0, -1))):
        with Locations((27.933485599, 0.5)):
            Rectangle(SKETCH_75_W, SKETCH_75_H)
    extrude(amount=-EXTRUDE_51_DEPTH)

    # 草图76 → 切除-拉伸31 (cut)
    with BuildSketch(Plane(origin=(31.5, 0, 0), x_dir=(0, 0, -1), z_dir=(1, 0, 0))):
        with Locations((4.295317817, -0.556752584)):
            Rectangle(SKETCH_76_W, SKETCH_76_H)
    extrude(amount=-CUT_EXTRUDE_31_DEPTH, mode=Mode.SUBTRACT)

    # 草图77 → 切除-拉伸32 (cut)
    with BuildSketch(Plane(origin=(31.5, 0, 0), x_dir=(0, 0, -1), z_dir=(1, 0, 0))):
        with Locations((-6.5, -2.5)):
            Rectangle(SKETCH_77_W, SKETCH_77_H)
    extrude(amount=-CUT_EXTRUDE_32_DEPTH, mode=Mode.SUBTRACT)

    # 草图72 → 凸台-拉伸52 (add)
    with BuildSketch(Plane(origin=(0, 0, 0), x_dir=(-1, 0, 0), z_dir=(0, 0, -1))):
        with Locations(Location((-28.5, 1, 0), (0, 0, 180))):
            Circle(SKETCH_72_R)
    extrude(amount=EXTRUDE_52_DEPTH)

    # 草图73 → 凸台-拉伸53 (add, two sides: drawn at the far end of the back side and taken through both)
    with BuildSketch(Plane(origin=(0, 0, 0), x_dir=(-1, 0, 0), z_dir=(0, 0, -1)).offset(-EXTRUDE_53_DEPTH_BACK)):
        with Locations((29.5, 1)):
            Circle(SKETCH_73_R)
    extrude(amount=EXTRUDE_53_DEPTH + EXTRUDE_53_DEPTH_BACK)

    # 草图78 → 凸台-拉伸54 (add)
    with BuildSketch(Plane(origin=(0, 0, -2), x_dir=(-1, 0, 0), z_dir=(0, 0, -1))):
        with Locations((-28.5, 1)):
            Circle(SKETCH_78_R)
        with Locations((29.5, 1)):
            Circle(SKETCH_78_R)
    extrude(amount=EXTRUDE_54_DEPTH)

    # 草图79 → 切除-拉伸33 (cut)
    with BuildSketch(Plane(origin=(0, 0, 0), x_dir=(-1, 0, 0), z_dir=(0, 0, -1))):
        with Locations((0.5, 1)):
            Rectangle(SKETCH_79_W, SKETCH_79_H)
    extrude(amount=-CUT_EXTRUDE_33_DEPTH, mode=Mode.SUBTRACT)

    # 草图80 → 凸台-拉伸55 (add)
    with BuildSketch(Plane(origin=(0, 0, 2), x_dir=(-1, 0, 0), z_dir=(0, 0, -1))):
        with Locations((-22.215, 3.5)):
            Rectangle(SKETCH_80_W, SKETCH_80_H)
    extrude(amount=EXTRUDE_55_DEPTH)

    # 草图81 → 切除-拉伸34 (cut)
    with BuildSketch(Plane(origin=(0, 0, 13), x_dir=(-1, 0, 0), z_dir=(0, 0, -1))):
        with Locations((-38.93, -21.5)):
            Rectangle(SKETCH_81_W, SKETCH_81_H)
        with Locations((-38.93, 19.5)):
            Rectangle(SKETCH_81_W, SKETCH_81_H)
    extrude(amount=-CUT_EXTRUDE_34_DEPTH, mode=Mode.SUBTRACT)

    # 草图82 → 切除-拉伸35 (cut)
    with BuildSketch(Plane(origin=(0, 27, 0), x_dir=(1, 0, 0), z_dir=(0, 1, 0))):
        with Locations((28.215, -8.5)):
            Rectangle(SKETCH_82_W, SKETCH_82_H)
    extrude(amount=-CUT_EXTRUDE_35_DEPTH, mode=Mode.SUBTRACT)

    # 草图83 → 凸台-拉伸56 (add)
    with BuildSketch(Plane(origin=(0, 0, 11), x_dir=(-1, 0, 0), z_dir=(0, 0, -1))):
        with Locations(Location((-49.434447137, 20.499990111, 0), (0, 0, 180))):
            Circle(SKETCH_83_R)
        with Locations(Location((-49.434447137, -22.500002676, 0), (0, 0, 180))):
            Circle(SKETCH_83_R)
        with Locations(Location((-28.432313614, -22.500002676, 0), (0, 0, 180))):
            Circle(SKETCH_83_R)
        with Locations((-28.432313614, 20.499990111)):
            Circle(SKETCH_83_R_2)
    extrude(amount=EXTRUDE_56_DEPTH)

    # 草图84 → 切除-拉伸36 (cut)
    with BuildSketch(Plane(origin=(0, 0, 10), x_dir=(-1, 0, 0), z_dir=(0, 0, -1))):
        with Locations((-28.17934676, 20.387325453)):
            Circle(SKETCH_84_R)
    extrude(amount=-CUT_EXTRUDE_36_DEPTH, mode=Mode.SUBTRACT)

    # 草图85 → 凸台-拉伸57 (add)
    with BuildSketch(Plane(origin=(0, 0, 13), x_dir=(-1, 0, 0), z_dir=(0, 0, -1))):
        with Locations(Location((-28.434447137, 20.499997271, 0), (0, 0, 180))):
            Circle(SKETCH_85_R)
    extrude(amount=EXTRUDE_57_DEPTH)


solid = cut_extrude_30_kept_piece.part
